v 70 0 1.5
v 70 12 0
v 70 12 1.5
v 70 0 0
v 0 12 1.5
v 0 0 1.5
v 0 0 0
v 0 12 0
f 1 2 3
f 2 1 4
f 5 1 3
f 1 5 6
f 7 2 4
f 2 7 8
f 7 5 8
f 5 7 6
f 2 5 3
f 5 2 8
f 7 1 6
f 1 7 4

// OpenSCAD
// 10-well Agarose Gel Comb
// Designed for FDM printing, lying flat on the XY plane (Z=0).

// --- Dimensions ---
// Spine dimensions
$spine_length = 70;   // mm (X)
$spine_width = 12;    // mm (Y)
$plate_thickness = 1.5; // mm (Z)

// Tooth dimensions
$num_teeth = 10;
$tooth_width = 5.0;   // mm (X)
$tooth_length = 12;   // mm (Y) (extends from spine edge)
$tooth_gap = 1.5;     // mm (X) between teeth

// --- Calculations ---
// Total width of the tooth row
$total_tooth_width = ($tooth_width * $num_teeth) + (($tooth_gap * ($num_teeth - 1)));

// Offset to center the tooth row on the spine width
// Spine is 12mm wide. Tooth row is centered.
// The teeth hang in -Y direction.
// We need to position the row so it is centered relative to the spine width.
// Let's define the row's local Y range first.
// The row has total width $total_tooth_width.
// The spine has width $spine_width.
// Center offset = ($spine_width - $total_tooth_width) / 2.
$center_offset_y = ($spine_width - $total_tooth_width) / 2;

// Calculate the start position of the first tooth in the +X direction
// The row is centered in X.
// Total X span of the row = $total_tooth_width.
// Half span = $total_tooth_width / 2.
$first_tooth_x = -($total_tooth_width / 2) + ($tooth_width / 2);

// --- Main Body ---
// Create the flat plate (spine + base)
// Dimensions: X=$spine_length, Y=$spine_width, Z=$plate_thickness
// Position: Centered at origin, resting on Z=0.
// So Z goes from 0 to $plate_thickness.
// X goes from -$spine_length/2 to +$spine_length/2.
// Y goes from -$spine_width/2 to +$spine_width/2.

difference() {
    // 1. The solid block
    translate([0, 0, 0])
    cube([
        $spine_length,
        $spine_width,
        $plate_thickness
    ]);

    // 2. Cut out the teeth
    // We iterate through each tooth and subtract it.
    // Tooth geometry:
    // X: from $first_tooth_x + (i * ($tooth_width + $tooth_gap)) to ...
    // Y: from -$spine_width/2 - $tooth_length to -$spine_width/2 (hanging down)
    // Z: from 0 to $plate_thickness
    
    for (i = [0 : $num_teeth - 1]) {
        // Calculate X position for this tooth
        $tooth_x = $first_tooth_x + (i * ($tooth_width + $tooth_gap));
        
        // Calculate Y position for this tooth
        // The tooth hangs from the edge at Y = -$spine_width/2
        // It extends $tooth_length in the -Y direction.
        $tooth_y_start = -($spine_width / 2) - $tooth_length;
        $tooth_y_end = -($spine_width / 2);
        
        // Define the cutting volume
        // Extend slightly in Z to ensure clean cut (Rule 5)
        $cut_height = $plate_thickness + 0.1;
        
        translate([
            $tooth_x,
            $tooth_y_start,
            0
        ])
        cube([
            $tooth_width,
            $tooth_length,
            $cut_height
        ]);
    }
}
